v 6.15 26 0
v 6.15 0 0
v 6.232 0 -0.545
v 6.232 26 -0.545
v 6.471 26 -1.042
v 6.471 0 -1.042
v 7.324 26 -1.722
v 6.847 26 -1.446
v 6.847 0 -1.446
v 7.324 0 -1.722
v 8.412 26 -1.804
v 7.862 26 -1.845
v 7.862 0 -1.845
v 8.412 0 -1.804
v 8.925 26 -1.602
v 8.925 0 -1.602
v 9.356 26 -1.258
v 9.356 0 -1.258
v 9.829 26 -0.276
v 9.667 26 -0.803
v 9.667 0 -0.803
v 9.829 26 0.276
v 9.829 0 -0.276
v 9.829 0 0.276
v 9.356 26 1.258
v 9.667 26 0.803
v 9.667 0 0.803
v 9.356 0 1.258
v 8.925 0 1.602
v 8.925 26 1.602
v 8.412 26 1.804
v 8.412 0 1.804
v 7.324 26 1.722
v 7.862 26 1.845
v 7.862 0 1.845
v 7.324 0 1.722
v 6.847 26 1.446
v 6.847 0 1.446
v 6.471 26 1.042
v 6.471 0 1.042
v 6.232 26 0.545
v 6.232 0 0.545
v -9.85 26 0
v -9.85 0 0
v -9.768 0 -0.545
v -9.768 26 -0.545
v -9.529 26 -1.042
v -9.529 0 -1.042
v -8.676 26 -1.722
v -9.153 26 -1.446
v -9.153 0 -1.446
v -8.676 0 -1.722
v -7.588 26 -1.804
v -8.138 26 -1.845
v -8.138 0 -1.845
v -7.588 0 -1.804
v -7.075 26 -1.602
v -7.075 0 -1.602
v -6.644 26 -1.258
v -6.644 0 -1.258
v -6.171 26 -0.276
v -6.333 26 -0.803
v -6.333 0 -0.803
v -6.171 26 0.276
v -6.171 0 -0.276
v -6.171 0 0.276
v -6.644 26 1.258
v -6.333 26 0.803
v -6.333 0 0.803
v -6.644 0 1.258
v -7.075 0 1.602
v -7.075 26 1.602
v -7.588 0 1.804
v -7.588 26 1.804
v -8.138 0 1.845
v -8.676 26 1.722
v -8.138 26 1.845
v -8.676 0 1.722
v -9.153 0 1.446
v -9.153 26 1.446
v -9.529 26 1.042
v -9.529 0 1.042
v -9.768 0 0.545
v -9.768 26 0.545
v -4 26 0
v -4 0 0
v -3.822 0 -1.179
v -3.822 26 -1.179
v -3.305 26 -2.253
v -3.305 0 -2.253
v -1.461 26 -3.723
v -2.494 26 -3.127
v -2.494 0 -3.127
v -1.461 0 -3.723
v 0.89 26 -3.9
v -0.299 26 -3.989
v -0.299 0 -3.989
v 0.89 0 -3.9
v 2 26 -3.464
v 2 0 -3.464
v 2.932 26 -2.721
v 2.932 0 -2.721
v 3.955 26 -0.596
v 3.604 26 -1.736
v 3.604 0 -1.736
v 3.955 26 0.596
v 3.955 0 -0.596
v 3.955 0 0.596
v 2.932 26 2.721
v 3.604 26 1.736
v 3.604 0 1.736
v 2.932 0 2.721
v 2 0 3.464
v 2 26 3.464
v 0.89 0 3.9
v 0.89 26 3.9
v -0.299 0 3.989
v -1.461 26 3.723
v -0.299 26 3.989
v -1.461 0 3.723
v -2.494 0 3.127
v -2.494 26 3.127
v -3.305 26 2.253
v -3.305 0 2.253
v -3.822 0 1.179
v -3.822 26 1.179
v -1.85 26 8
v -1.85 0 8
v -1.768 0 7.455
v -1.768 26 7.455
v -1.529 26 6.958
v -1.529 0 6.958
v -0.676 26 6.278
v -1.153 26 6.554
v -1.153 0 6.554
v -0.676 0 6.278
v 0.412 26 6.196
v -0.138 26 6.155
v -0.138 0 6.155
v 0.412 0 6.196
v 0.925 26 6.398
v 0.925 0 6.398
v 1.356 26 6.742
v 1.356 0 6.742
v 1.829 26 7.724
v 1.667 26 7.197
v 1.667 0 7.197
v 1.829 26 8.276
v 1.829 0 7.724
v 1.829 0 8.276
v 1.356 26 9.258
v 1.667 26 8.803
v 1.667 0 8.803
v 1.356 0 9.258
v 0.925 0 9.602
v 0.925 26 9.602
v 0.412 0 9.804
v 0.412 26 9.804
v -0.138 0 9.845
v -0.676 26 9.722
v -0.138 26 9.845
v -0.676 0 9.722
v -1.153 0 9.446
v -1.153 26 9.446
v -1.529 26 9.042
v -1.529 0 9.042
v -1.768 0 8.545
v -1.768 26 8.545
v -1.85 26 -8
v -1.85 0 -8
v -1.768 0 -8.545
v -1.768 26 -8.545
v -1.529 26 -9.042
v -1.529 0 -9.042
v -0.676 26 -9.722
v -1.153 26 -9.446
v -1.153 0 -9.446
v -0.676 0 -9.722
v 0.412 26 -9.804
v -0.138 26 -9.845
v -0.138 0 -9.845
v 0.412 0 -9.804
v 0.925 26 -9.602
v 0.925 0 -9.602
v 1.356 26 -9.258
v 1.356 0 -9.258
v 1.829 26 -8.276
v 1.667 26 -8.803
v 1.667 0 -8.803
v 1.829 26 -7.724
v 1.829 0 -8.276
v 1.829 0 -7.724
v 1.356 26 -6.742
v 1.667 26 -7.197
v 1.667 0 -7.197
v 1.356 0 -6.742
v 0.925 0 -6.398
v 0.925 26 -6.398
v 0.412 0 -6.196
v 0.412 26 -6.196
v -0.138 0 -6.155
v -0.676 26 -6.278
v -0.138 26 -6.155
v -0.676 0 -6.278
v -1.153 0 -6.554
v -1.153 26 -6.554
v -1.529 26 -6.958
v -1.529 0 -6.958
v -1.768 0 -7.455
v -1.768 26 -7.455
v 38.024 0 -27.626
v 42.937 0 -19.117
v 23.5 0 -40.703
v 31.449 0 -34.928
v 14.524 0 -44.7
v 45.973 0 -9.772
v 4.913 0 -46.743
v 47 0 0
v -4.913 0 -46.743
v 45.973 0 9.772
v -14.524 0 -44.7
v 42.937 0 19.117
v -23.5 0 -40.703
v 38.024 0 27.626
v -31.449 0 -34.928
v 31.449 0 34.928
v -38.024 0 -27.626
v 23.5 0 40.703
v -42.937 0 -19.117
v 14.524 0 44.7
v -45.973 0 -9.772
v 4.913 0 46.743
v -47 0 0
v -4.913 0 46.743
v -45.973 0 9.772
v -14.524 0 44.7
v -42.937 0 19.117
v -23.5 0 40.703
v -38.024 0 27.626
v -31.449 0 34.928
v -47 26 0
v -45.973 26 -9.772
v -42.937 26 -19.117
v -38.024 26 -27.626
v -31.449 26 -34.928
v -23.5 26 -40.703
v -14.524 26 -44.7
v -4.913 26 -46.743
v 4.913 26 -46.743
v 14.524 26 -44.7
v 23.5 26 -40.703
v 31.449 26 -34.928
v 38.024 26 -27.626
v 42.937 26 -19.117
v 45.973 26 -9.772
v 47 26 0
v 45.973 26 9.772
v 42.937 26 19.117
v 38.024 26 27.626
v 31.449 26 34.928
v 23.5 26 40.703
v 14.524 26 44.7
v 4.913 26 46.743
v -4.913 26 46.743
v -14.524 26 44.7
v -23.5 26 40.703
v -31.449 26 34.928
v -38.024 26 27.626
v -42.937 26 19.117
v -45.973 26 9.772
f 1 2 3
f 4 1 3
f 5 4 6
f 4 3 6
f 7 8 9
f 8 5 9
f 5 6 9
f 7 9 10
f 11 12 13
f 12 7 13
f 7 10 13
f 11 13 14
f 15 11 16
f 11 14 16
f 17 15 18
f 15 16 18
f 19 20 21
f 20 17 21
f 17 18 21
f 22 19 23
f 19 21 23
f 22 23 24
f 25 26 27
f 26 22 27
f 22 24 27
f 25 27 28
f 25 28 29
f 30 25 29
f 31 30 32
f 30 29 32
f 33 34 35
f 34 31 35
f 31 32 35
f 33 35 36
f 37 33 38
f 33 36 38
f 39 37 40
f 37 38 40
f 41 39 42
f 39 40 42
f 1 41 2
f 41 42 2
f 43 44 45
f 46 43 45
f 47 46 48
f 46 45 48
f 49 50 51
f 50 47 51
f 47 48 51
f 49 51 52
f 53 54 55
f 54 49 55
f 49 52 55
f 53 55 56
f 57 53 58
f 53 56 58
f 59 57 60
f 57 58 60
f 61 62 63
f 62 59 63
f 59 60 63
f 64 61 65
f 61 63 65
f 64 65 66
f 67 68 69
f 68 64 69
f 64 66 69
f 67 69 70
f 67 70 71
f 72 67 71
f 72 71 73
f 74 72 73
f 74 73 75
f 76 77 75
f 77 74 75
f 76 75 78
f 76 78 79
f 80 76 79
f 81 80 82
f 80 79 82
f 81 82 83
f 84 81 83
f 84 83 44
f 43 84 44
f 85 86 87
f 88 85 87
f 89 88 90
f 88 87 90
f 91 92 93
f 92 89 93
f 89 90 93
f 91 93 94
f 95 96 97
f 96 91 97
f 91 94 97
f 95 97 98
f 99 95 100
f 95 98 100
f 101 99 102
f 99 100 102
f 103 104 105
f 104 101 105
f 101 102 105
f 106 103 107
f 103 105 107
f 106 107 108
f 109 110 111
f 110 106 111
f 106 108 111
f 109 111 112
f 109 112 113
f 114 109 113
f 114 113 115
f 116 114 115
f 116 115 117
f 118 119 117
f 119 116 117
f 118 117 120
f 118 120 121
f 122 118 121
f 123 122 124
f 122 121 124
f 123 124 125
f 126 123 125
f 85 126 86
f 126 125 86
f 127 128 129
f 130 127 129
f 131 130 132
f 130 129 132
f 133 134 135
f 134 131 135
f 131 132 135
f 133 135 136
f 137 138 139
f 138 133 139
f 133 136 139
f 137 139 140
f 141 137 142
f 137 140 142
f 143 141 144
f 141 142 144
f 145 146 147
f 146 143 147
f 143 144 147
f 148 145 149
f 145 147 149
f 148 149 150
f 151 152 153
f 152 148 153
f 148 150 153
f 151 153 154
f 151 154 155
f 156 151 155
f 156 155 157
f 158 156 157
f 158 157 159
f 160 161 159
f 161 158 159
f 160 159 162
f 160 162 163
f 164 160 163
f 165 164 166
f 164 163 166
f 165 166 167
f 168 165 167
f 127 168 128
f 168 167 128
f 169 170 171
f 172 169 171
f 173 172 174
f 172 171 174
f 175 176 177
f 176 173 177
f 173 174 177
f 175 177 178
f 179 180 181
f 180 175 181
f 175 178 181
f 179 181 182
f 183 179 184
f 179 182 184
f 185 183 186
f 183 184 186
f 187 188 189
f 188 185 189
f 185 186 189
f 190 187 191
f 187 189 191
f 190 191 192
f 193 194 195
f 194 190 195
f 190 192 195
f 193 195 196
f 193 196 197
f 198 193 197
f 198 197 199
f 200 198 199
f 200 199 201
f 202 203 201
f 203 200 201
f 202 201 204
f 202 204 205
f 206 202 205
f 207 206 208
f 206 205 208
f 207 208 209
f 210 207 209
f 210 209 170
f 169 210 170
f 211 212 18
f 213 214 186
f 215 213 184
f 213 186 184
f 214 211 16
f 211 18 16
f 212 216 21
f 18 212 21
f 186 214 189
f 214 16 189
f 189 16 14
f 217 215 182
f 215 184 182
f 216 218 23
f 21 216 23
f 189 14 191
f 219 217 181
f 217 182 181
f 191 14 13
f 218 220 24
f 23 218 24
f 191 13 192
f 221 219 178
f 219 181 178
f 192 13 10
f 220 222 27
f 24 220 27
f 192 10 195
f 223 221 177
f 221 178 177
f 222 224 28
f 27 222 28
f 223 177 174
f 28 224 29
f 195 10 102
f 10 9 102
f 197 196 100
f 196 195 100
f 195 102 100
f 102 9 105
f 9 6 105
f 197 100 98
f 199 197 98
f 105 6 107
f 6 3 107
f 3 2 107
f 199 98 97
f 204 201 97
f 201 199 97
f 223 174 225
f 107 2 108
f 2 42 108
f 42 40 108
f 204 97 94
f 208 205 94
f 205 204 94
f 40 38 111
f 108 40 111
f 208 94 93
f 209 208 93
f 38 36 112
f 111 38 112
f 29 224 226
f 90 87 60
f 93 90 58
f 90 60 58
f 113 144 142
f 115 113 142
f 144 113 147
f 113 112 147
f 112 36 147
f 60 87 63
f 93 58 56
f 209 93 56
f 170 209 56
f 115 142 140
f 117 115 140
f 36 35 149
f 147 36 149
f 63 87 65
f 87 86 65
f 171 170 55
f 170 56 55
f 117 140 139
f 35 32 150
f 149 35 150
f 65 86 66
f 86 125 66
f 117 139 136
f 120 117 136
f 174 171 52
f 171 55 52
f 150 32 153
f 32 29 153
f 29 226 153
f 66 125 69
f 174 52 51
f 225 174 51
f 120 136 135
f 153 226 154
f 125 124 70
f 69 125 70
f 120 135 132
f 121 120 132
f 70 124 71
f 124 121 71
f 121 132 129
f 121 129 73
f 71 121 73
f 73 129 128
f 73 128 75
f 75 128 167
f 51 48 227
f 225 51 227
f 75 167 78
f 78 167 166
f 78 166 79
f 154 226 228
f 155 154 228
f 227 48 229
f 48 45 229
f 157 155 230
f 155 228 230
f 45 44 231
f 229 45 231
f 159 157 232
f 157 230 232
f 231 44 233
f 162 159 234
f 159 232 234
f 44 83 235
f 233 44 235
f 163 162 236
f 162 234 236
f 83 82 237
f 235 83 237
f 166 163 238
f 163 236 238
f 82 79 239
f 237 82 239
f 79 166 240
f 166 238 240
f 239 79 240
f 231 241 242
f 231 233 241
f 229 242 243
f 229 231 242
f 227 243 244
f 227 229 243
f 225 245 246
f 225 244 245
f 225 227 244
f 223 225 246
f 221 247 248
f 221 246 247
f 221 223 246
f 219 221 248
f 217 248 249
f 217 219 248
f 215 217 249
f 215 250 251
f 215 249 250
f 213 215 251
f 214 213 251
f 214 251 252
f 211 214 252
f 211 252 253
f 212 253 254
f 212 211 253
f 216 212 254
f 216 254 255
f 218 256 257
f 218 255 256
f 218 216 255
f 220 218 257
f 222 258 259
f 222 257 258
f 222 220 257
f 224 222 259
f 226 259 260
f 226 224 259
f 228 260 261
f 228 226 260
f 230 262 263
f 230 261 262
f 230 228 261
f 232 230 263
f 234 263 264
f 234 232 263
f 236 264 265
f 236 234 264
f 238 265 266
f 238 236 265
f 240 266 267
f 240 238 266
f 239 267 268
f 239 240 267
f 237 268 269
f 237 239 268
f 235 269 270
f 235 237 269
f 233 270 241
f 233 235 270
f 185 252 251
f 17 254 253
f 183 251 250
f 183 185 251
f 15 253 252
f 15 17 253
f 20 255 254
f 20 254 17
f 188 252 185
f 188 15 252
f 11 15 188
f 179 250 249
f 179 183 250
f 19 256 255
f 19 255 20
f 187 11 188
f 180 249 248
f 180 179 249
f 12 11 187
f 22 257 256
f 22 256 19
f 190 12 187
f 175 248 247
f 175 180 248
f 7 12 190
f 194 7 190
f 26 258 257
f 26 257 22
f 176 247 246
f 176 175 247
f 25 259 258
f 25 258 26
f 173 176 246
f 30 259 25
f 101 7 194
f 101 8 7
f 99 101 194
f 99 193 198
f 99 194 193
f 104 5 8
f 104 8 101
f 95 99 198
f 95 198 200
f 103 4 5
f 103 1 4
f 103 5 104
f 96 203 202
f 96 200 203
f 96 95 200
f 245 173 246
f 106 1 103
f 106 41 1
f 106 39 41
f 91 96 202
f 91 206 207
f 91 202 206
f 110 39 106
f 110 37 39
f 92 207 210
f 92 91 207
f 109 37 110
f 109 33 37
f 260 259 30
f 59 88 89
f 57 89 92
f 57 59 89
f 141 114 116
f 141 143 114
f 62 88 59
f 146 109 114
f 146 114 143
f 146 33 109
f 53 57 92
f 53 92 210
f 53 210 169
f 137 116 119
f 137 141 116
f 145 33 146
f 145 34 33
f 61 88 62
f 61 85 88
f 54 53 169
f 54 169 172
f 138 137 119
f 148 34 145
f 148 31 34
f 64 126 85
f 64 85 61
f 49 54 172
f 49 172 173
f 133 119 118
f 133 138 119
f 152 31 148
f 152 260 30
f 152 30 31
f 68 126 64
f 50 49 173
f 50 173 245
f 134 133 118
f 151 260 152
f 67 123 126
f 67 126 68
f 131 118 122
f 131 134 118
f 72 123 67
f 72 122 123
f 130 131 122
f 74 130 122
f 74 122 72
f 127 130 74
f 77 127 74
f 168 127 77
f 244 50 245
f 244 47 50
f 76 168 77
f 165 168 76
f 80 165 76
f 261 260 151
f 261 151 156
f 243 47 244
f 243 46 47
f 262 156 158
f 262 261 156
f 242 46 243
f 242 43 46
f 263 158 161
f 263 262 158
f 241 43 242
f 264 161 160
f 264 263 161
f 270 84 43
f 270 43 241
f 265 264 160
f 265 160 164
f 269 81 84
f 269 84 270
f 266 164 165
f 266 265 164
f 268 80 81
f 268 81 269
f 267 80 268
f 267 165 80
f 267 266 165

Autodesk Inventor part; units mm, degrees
ref_plane "YZ Plane" through (0, 0, 0) normal (1, 0, 0) x (0, 1, 0)
ref_plane "XZ Plane" through (0, 0, 0) normal (0, 1, 0) x (-1, 0, 0)
ref_plane "XY Plane" through (0, 0, 0) normal (0, 0, 1) x (1, 0, 0)
sketch "Sketch1" plane through (0, 0, 0) normal (0, 1, 0) x (-1, 0, 0)
  circle A0 centre (0, 0) radius 47
  circle A1 centre (0, 0) radius 4 projected
  circle A2 centre (0, 8) radius 1.85 projected
  circle A3 centre (-8, 0) radius 1.85 projected
  circle A4 centre (8, 0) radius 1.85 projected
  circle A5 centre (0, -8) radius 1.85 projected
  dimension "d0" = 94
extrude "Extrusion2" add sketch "Sketch1" along normal blind 26
properties part number "AM Wheel"
